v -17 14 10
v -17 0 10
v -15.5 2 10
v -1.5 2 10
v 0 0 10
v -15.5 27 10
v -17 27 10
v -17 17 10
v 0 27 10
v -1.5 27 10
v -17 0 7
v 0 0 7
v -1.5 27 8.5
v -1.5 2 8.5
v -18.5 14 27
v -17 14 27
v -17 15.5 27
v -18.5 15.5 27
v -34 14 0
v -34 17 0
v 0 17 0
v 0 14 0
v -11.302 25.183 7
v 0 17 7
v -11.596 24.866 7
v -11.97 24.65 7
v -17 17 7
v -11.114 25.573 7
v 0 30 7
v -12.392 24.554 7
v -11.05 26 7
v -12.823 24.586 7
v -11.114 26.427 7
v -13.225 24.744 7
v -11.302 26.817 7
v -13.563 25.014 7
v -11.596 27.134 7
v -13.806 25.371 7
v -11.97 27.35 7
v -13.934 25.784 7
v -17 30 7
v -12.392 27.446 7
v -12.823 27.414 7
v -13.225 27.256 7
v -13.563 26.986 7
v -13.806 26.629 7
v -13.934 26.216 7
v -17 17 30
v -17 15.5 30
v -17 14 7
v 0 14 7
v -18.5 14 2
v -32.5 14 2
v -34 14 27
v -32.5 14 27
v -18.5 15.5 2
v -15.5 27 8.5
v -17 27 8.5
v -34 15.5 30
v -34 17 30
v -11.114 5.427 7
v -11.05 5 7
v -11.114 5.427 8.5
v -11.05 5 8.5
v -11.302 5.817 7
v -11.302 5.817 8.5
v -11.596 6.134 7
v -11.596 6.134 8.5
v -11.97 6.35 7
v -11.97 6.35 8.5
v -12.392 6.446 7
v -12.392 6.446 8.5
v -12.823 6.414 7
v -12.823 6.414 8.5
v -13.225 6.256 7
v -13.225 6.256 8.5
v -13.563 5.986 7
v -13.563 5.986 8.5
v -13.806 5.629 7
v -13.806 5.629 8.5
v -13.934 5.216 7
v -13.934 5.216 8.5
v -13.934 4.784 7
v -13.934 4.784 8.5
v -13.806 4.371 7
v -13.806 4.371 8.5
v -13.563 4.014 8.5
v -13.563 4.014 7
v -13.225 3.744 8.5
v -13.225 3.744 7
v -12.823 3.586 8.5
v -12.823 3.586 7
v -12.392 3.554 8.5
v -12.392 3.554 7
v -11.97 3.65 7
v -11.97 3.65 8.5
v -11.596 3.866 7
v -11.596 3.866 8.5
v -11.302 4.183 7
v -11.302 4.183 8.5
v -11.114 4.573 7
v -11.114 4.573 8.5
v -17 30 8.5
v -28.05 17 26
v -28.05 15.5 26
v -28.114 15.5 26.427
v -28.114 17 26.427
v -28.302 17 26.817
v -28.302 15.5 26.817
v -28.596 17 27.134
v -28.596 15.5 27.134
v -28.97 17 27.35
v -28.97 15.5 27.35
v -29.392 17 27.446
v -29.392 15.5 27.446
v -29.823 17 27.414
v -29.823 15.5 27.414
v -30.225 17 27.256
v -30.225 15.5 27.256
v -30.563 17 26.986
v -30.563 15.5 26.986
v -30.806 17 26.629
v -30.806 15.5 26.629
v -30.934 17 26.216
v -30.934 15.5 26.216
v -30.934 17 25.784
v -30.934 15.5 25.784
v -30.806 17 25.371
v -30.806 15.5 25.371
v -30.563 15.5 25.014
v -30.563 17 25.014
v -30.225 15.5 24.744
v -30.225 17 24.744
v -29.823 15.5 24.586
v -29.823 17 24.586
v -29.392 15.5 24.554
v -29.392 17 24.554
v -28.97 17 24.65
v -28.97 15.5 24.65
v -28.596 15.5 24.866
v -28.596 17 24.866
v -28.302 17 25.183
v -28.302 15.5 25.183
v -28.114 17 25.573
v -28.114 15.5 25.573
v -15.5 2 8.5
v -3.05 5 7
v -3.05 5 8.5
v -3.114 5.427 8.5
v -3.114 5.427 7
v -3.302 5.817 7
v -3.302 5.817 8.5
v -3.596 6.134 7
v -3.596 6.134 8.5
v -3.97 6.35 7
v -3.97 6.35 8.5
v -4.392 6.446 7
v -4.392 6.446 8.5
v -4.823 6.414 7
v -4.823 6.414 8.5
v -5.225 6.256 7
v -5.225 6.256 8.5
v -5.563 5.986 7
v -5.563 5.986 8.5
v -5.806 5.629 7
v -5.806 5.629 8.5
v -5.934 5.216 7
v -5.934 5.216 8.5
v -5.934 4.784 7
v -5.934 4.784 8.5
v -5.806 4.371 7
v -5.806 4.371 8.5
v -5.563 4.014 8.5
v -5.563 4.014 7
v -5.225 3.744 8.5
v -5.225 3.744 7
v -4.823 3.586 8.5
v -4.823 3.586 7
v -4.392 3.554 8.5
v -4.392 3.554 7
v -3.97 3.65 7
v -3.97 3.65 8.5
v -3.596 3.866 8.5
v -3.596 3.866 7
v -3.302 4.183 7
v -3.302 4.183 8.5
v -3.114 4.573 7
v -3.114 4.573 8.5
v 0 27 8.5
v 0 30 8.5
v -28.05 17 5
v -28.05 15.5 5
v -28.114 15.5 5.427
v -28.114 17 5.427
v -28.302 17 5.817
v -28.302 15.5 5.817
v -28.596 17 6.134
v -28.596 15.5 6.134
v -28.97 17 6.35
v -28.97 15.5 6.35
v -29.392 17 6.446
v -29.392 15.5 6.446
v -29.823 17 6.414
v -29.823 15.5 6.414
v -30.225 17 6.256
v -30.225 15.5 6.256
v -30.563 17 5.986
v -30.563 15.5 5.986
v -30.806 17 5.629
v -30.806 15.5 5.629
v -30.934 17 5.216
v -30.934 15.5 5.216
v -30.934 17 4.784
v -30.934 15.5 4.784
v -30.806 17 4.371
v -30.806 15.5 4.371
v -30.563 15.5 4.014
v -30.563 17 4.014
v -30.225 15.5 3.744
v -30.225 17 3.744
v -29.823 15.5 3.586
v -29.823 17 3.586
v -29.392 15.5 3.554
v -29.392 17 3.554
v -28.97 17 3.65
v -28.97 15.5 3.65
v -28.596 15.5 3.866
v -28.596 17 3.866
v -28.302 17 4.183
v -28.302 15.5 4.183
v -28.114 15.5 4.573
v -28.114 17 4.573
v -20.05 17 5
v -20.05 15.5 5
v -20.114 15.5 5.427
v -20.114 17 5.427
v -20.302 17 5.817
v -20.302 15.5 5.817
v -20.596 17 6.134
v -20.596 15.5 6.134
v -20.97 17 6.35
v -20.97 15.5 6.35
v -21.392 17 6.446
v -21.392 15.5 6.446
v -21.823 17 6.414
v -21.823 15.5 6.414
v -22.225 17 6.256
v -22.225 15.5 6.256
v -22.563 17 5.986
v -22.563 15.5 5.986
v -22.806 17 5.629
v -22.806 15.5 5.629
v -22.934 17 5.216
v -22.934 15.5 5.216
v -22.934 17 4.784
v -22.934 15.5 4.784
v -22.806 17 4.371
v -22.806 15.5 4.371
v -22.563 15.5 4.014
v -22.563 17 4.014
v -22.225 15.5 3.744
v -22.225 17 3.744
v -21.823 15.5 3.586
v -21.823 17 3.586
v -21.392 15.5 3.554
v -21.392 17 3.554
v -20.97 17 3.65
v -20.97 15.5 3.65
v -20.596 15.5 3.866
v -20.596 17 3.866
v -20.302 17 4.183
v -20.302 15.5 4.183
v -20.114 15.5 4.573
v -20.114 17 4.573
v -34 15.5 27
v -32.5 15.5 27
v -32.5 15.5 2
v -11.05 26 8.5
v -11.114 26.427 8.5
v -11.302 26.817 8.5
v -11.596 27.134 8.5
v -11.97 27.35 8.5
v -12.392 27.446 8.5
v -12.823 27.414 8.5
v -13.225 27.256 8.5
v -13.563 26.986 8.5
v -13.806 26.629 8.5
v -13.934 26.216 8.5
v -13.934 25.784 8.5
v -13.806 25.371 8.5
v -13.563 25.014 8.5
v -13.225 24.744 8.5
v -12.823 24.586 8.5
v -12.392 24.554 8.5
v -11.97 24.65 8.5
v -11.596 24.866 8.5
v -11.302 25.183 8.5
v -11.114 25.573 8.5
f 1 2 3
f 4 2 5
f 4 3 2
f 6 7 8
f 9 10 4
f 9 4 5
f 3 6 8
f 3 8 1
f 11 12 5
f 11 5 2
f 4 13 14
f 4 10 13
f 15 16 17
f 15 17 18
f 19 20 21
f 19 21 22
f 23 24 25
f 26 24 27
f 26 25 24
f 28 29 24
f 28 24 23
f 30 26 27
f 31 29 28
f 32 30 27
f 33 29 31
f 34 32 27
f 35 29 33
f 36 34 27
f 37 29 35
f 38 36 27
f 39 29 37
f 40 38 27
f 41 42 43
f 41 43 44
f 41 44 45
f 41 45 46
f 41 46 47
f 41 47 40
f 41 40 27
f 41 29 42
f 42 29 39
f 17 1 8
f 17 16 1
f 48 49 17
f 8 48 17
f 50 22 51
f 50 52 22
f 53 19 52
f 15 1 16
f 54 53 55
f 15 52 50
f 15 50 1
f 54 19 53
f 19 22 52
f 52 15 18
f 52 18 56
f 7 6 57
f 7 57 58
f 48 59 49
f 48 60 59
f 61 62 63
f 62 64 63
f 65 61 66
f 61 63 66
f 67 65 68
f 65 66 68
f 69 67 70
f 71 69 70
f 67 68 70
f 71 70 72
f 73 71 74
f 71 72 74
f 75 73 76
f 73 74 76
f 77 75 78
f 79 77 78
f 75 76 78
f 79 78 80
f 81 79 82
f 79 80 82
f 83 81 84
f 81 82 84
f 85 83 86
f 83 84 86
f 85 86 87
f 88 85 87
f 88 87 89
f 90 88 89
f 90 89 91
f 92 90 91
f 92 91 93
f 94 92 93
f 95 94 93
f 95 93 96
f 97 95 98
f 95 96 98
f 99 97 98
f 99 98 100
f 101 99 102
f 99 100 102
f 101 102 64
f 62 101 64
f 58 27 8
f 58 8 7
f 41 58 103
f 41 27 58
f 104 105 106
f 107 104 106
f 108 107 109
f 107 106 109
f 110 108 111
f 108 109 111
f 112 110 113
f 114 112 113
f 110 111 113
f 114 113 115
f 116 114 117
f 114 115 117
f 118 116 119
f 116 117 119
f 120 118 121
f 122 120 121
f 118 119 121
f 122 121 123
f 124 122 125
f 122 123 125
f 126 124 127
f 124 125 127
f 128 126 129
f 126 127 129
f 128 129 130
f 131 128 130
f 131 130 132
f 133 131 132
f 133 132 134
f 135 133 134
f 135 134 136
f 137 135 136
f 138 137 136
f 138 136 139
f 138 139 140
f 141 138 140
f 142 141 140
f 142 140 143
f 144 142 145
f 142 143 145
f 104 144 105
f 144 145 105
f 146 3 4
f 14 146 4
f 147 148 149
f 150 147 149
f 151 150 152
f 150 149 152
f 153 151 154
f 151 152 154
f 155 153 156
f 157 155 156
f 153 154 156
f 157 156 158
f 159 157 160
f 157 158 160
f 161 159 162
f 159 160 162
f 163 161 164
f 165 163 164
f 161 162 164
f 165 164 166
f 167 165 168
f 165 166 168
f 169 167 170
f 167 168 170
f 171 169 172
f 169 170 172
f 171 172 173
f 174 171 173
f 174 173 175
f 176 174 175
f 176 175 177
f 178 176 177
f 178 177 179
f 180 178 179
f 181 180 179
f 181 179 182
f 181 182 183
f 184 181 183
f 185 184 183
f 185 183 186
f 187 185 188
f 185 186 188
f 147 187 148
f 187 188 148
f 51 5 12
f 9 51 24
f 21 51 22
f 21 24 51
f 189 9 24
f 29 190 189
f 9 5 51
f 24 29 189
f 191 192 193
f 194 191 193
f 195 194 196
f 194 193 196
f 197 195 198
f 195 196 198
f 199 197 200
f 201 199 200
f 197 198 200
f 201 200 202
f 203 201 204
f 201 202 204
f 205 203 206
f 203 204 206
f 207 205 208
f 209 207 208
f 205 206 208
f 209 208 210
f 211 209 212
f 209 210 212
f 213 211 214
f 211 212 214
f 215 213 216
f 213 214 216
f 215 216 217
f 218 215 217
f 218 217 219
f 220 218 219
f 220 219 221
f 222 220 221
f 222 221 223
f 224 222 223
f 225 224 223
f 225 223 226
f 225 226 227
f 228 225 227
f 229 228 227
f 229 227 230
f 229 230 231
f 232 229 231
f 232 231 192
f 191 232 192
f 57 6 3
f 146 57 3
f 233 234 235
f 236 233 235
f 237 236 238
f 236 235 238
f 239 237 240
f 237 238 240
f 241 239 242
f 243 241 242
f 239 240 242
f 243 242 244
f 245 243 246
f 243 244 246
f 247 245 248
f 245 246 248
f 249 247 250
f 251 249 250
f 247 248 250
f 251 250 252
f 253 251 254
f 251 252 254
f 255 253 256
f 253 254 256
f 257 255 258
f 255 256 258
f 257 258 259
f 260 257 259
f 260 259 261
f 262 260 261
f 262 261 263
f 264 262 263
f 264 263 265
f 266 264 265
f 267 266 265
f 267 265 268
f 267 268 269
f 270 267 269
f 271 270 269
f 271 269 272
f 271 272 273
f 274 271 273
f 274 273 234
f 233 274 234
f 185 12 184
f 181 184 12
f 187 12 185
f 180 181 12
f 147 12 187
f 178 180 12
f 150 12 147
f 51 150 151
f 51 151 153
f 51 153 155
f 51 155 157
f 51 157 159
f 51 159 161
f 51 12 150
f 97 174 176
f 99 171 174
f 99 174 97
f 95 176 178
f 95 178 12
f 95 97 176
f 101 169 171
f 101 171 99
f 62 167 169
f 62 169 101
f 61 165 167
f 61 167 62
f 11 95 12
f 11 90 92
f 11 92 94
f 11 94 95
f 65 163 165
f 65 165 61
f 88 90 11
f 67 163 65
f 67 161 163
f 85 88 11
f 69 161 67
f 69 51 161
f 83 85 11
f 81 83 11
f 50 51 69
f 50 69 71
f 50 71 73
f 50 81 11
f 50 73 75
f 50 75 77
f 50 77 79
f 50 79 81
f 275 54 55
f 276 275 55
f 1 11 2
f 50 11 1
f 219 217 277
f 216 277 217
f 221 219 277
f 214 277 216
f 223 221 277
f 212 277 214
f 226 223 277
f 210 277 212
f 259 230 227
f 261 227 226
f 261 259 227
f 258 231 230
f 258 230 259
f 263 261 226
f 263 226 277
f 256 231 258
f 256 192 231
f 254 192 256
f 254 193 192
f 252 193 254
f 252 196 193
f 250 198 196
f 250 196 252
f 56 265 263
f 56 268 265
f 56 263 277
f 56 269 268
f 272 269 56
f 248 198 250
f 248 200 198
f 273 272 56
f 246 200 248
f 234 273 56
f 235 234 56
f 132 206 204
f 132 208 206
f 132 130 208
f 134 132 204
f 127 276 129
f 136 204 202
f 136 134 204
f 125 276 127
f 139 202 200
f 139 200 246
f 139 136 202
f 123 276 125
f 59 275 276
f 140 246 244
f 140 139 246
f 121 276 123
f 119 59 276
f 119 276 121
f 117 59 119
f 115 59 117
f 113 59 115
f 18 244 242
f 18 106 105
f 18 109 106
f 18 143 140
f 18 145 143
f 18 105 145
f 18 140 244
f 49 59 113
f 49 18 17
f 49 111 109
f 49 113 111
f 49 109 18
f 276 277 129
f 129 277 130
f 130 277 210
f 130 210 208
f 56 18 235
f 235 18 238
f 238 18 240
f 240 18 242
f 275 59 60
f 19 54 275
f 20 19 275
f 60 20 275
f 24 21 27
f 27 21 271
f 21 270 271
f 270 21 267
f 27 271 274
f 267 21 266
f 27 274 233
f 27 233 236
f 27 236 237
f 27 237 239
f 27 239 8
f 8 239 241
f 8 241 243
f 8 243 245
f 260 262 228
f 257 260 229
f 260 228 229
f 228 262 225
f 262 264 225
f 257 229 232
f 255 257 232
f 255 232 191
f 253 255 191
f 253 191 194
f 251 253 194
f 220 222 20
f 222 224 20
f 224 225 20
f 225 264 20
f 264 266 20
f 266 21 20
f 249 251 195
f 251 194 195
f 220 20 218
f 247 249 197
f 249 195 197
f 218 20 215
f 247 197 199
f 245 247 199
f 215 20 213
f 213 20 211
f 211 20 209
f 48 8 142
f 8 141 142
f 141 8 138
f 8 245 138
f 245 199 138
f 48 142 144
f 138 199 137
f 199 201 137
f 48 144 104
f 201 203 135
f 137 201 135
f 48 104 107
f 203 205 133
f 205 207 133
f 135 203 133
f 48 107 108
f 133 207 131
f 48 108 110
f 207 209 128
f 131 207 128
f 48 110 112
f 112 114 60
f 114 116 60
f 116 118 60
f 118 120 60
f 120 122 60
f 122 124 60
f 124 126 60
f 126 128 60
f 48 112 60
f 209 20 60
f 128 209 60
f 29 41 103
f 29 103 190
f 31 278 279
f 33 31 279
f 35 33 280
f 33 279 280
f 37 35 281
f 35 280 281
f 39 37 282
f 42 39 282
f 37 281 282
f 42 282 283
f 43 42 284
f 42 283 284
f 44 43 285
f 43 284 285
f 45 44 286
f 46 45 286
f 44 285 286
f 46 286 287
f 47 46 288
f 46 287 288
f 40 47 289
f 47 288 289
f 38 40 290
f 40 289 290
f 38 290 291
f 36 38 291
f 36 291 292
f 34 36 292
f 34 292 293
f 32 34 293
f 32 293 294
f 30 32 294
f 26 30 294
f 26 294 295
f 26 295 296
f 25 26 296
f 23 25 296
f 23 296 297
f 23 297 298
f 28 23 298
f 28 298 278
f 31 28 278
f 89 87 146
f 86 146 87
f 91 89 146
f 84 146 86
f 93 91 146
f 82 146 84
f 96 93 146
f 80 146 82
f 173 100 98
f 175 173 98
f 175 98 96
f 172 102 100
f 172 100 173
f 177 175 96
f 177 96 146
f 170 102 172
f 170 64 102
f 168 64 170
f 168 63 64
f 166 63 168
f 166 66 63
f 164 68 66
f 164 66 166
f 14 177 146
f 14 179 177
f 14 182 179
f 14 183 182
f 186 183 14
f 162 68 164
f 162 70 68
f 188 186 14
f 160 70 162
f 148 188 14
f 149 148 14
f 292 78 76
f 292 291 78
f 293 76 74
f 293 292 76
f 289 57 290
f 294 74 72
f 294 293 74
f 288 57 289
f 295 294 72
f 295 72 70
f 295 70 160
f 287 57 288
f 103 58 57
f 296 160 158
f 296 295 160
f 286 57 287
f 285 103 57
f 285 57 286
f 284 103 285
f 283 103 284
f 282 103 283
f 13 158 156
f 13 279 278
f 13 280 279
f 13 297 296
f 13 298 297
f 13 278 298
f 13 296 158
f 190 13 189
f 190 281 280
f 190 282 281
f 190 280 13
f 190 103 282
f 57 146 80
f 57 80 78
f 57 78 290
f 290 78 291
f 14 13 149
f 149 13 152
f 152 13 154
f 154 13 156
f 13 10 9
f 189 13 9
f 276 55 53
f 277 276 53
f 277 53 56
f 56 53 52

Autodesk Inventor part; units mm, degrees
ref_plane "YZ Plane" through (0, 0, 0) normal (1, 0, 0) x (0, 1, 0)
ref_plane "XZ Plane" through (0, 0, 0) normal (0, 1, 0) x (-1, 0, 0)
ref_plane "XY Plane" through (0, 0, 0) normal (0, 0, 1) x (1, 0, 0)
sketch "Sketch1" plane through (0, 0, 0) normal (0, 0, 1) x (1, 0, 0)
  line L0 (-34, 17) -> (-17, 17)
  line L1 (-17, 17) -> (-17, 30)
  line L2 (-17, 30) -> (0, 30)
  line L3 (0, 30) -> (0, 0)
  line L4 (0, 0) -> (-17, 0)
  line L5 (-17, 0) -> (-17, 14)
  line L6 (-17, 14) -> (-34, 14)
  line L7 (-34, 14) -> (-34, 17)
  dimension "d0" = 17
  dimension "d1" = 13
  dimension "d2" = 17
  dimension "d4" = 17
  dimension "d5" = 14
  dimension "d72" = 3
extrude "Extrusion1" add sketch "Sketch1" along normal blind 30
sketch "Sketch4" plane through (0, 0, 0) normal (0, 0, -1) x (-1, 0, 0)
  line L0 (34, 17) -> (17, 17) projected
  line L1 (17, 17) -> (17, 30) projected
  line L2 (17, 30) -> (0, 30) projected
  line L3 (0, 30) -> (0, 0) projected
  line L4 (0, 0) -> (17, 0) projected
  line L5 (17, 0) -> (17, 14) projected
  line L6 (17, 14) -> (34, 14) projected
  line L7 (34, 14) -> (34, 17) projected
  line L8 (17, 0) -> (0, 0)
  line L9 (0, 0) -> (0, 30)
  line L10 (0, 30) -> (17, 30)
  line L11 (17, 30) -> (17, 0)
extrude "Extrusion4" cut sketch "Sketch4" against normal blind 7 contours L11 L5 L4 L3 L2 L1
sketch "Sketch8" plane through (0, 0, 30) normal (0, 0, 1) x (1, 0, 0)
  line L0 (-17, 17) -> (-34, 17) projected
  line L1 (-34, 17) -> (-34, 14) projected
  line L2 (-34, 14) -> (-17, 14) projected
  line L3 (-17, 14) -> (-17, 0) projected
  line L4 (-17, 0) -> (0, 0) projected
  line L5 (0, 0) -> (0, 30) projected
  line L6 (0, 30) -> (-17, 30) projected
  line L7 (-17, 30) -> (-17, 17) projected
  line L8 (-17, 30) -> (0, 30)
  line L9 (0, 30) -> (0, 0)
  line L10 (0, 0) -> (-17, 0)
  line L11 (-17, 0) -> (-17, 30)
extrude "Extrusion8" cut sketch "Sketch8" against normal blind 20 contours L7 L6 L5 L4 L3 L11
sketch "Sketch9" plane through (-34, 14, 0) normal (0, -1, 0) x (1, 0, 0)
  line L0 (17, 0) -> (0, 0) projected
  line L1 (17, 0) -> (17, 7) projected
  line L2 (17, 7) -> (17, 10) projected
  line L3 (17, 10) -> (17, 30) projected
  line L4 (0, 30) -> (17, 30) projected
  line L5 (0, 0) -> (0, 30) projected
  line L6 (0, 0) -> (17, 0) projected
  line L7 (0, 30) -> (17, 30) projected
  line L8 (17, 0) -> (0, 0) projected
  line L9 (17, 10) -> (17, 30) projected
  line L10 (17, 30) -> (0, 30) projected
  line L11 (0, 0) -> (0, 30) projected
  line L12 (0, 27) -> (1.5, 27)
  line L13 (1.5, 27) -> (1.5, 2)
  line L14 (1.5, 2) -> (15.5, 2)
  line L15 (17, 27) -> (15.5, 27)
  line L16 (15.5, 27) -> (15.5, 2)
  line L17 (0, 27) -> (0, 30)
  line L18 (17, 30) -> (17, 27)
  point P0 (34, 0)
  dimension "d80" = 1.5
  dimension "d81" = 2
  dimension "d82" = 25
  dimension "d83" = 14
extrude "Extrusion14" cut sketch "Sketch9" against normal blind 1.5 contours L5 L4 L3 L15 L16 L14 L13 L12
sketch "Sketch14" plane through (0, 0, 10) normal (0, 0, 1) x (1, 0, 0)
  line L0 (0, 30) -> (0, 0) projected
  line L1 (-17, 30) -> (0, 30) projected
  line L2 (-17, 17) -> (-17, 30) projected
  line L3 (-17, 14) -> (-17, 17) projected
  line L4 (-17, 0) -> (-17, 14) projected
  line L5 (0, 0) -> (-17, 0) projected
  line L6 (-17, 30) -> (-17, 27)
  line L7 (-17, 30) -> (-17, 17) projected
  line L8 (-15.5, 27) -> (-15.5, 2)
  line L9 (-15.5, 2) -> (-1.5, 2)
  line L10 (-15.5, 27) -> (-17, 27)
  line L11 (-17, 30) -> (0, 30)
  line L12 (0, 30) -> (-17, 30) projected
  line L13 (-17, 0) -> (0, 0) projected
  line L14 (0, 27) -> (0, 30)
  line L15 (-1.5, 27) -> (-1.5, 2)
  line L16 (-1.5, 27) -> (0, 27)
  line L17 (0, 30) -> (0, 0) projected
  point P0 (0, 30)
  point P1 (-16.25, 27)
  point P2 (-0.75, 27)
  dimension "d87" = 1.5
  dimension "d88" = 2
  dimension "d89" = 25
  dimension "d91" = 1.5
  dimension "d93" = 14
extrude "Extrusion15" cut sketch "Sketch14" against normal blind 1.5 contours L0 L16 L15 L9 L8 L10 L2 L1
sketch "Sketch15" plane through (-34, 15.5, 0) normal (0, -1, 0) x (1, 0, 0)
  line L0 (0, 30) -> (17, 30) projected
  line L1 (0, 27) -> (0, 30) projected
  line L2 (1.5, 27) -> (0, 27) projected
  line L3 (1.5, 2) -> (1.5, 27) projected
  line L4 (15.5, 2) -> (1.5, 2) projected
  line L5 (15.5, 27) -> (15.5, 2) projected
  line L6 (17, 27) -> (15.5, 27) projected
  line L7 (17, 30) -> (17, 27) projected
  circle A0 centre (4.5, 26) radius 1.45
  circle A1 centre (4.5, 5) radius 1.45
  circle A2 centre (12.5, 5) radius 1.45
  point P0 (34, 0)
  dimension "d96" = 2.9
  dimension "d97" = 21
  dimension "d98" = 8
  dimension "d99" = 3
  dimension "d100" = 3
extrude "Extrusion16" cut sketch "Sketch15" against normal through all contours A0 | A1 | A2
sketch "Sketch16" plane through (0, 0, 8.5) normal (0, 0, 1) x (1, 0, 0)
  line L0 (-17, 27) -> (-17, 30) projected
  line L1 (-15.5, 27) -> (-17, 27) projected
  line L2 (-15.5, 2) -> (-15.5, 27) projected
  line L3 (-1.5, 2) -> (-15.5, 2) projected
  line L4 (-1.5, 27) -> (-1.5, 2) projected
  line L5 (0, 27) -> (-1.5, 27) projected
  line L6 (0, 30) -> (0, 27) projected
  line L7 (-17, 30) -> (0, 30) projected
  circle A0 centre (-12.5, 5) radius 1.45
  circle A1 centre (-4.5, 5) radius 1.45
  circle A2 centre (-12.5, 26) radius 1.45
  point P0 (0, 0)
  dimension "d103" = 3
  dimension "d104" = 3
  dimension "d105" = 8
  dimension "d106" = 21
  dimension "d107" = 2.9
extrude "Extrusion18" cut sketch "Sketch16" against normal through all contours A0 | A1 | A2
sketch "Sketch17" plane through (-17, 14, 0) normal (1, 0, 0) x (0, 0, -1)
  line L0 (0, 0) -> (-7, 0) projected
  line L1 (0, 3) -> (0, 0) projected
  line L2 (0, 3) -> (-7, 3) projected
  line L3 (-7, 3) -> (-7, 0) projected
  line L4 (0, 0) -> (-7, 0)
  line L5 (-7, 0) -> (-7, 3)
  line L6 (-7, 3) -> (0, 3)
  line L7 (0, 3) -> (0, 0)
  point P0 (0, -14)
  dimension "d54" = 2.7
  dimension "d55" = 21
  dimension "d56" = 3
  dimension "d57" = 8
  dimension "d58" = 3
  dimension "d59" = 2.8
  dimension "d60" = 21
  dimension "d61" = 8
  dimension "d62" = 3
  dimension "d63" = 3
extrude "Extrusion19" add sketch "Sketch17" along normal up to surface (17 mm away) from surface at 0
sketch "Sketch13" plane through (-17, 14, 0) normal (1, 0, 0) x (0, 0, -1)
  line L0 (0, 0) -> (-7, 0) projected
  line L1 (0, 3) -> (0, 0) projected
  line L2 (0, 3) -> (-7, 3) projected
  line L3 (-7, 3) -> (-7, 0) projected
  line L4 (0, 0) -> (-7, 0)
  line L5 (-7, 0) -> (-7, 3)
  line L6 (-7, 3) -> (0, 3)
  line L7 (0, 3) -> (0, 0)
  point P0 (0, -14)
properties part number "soporte"
